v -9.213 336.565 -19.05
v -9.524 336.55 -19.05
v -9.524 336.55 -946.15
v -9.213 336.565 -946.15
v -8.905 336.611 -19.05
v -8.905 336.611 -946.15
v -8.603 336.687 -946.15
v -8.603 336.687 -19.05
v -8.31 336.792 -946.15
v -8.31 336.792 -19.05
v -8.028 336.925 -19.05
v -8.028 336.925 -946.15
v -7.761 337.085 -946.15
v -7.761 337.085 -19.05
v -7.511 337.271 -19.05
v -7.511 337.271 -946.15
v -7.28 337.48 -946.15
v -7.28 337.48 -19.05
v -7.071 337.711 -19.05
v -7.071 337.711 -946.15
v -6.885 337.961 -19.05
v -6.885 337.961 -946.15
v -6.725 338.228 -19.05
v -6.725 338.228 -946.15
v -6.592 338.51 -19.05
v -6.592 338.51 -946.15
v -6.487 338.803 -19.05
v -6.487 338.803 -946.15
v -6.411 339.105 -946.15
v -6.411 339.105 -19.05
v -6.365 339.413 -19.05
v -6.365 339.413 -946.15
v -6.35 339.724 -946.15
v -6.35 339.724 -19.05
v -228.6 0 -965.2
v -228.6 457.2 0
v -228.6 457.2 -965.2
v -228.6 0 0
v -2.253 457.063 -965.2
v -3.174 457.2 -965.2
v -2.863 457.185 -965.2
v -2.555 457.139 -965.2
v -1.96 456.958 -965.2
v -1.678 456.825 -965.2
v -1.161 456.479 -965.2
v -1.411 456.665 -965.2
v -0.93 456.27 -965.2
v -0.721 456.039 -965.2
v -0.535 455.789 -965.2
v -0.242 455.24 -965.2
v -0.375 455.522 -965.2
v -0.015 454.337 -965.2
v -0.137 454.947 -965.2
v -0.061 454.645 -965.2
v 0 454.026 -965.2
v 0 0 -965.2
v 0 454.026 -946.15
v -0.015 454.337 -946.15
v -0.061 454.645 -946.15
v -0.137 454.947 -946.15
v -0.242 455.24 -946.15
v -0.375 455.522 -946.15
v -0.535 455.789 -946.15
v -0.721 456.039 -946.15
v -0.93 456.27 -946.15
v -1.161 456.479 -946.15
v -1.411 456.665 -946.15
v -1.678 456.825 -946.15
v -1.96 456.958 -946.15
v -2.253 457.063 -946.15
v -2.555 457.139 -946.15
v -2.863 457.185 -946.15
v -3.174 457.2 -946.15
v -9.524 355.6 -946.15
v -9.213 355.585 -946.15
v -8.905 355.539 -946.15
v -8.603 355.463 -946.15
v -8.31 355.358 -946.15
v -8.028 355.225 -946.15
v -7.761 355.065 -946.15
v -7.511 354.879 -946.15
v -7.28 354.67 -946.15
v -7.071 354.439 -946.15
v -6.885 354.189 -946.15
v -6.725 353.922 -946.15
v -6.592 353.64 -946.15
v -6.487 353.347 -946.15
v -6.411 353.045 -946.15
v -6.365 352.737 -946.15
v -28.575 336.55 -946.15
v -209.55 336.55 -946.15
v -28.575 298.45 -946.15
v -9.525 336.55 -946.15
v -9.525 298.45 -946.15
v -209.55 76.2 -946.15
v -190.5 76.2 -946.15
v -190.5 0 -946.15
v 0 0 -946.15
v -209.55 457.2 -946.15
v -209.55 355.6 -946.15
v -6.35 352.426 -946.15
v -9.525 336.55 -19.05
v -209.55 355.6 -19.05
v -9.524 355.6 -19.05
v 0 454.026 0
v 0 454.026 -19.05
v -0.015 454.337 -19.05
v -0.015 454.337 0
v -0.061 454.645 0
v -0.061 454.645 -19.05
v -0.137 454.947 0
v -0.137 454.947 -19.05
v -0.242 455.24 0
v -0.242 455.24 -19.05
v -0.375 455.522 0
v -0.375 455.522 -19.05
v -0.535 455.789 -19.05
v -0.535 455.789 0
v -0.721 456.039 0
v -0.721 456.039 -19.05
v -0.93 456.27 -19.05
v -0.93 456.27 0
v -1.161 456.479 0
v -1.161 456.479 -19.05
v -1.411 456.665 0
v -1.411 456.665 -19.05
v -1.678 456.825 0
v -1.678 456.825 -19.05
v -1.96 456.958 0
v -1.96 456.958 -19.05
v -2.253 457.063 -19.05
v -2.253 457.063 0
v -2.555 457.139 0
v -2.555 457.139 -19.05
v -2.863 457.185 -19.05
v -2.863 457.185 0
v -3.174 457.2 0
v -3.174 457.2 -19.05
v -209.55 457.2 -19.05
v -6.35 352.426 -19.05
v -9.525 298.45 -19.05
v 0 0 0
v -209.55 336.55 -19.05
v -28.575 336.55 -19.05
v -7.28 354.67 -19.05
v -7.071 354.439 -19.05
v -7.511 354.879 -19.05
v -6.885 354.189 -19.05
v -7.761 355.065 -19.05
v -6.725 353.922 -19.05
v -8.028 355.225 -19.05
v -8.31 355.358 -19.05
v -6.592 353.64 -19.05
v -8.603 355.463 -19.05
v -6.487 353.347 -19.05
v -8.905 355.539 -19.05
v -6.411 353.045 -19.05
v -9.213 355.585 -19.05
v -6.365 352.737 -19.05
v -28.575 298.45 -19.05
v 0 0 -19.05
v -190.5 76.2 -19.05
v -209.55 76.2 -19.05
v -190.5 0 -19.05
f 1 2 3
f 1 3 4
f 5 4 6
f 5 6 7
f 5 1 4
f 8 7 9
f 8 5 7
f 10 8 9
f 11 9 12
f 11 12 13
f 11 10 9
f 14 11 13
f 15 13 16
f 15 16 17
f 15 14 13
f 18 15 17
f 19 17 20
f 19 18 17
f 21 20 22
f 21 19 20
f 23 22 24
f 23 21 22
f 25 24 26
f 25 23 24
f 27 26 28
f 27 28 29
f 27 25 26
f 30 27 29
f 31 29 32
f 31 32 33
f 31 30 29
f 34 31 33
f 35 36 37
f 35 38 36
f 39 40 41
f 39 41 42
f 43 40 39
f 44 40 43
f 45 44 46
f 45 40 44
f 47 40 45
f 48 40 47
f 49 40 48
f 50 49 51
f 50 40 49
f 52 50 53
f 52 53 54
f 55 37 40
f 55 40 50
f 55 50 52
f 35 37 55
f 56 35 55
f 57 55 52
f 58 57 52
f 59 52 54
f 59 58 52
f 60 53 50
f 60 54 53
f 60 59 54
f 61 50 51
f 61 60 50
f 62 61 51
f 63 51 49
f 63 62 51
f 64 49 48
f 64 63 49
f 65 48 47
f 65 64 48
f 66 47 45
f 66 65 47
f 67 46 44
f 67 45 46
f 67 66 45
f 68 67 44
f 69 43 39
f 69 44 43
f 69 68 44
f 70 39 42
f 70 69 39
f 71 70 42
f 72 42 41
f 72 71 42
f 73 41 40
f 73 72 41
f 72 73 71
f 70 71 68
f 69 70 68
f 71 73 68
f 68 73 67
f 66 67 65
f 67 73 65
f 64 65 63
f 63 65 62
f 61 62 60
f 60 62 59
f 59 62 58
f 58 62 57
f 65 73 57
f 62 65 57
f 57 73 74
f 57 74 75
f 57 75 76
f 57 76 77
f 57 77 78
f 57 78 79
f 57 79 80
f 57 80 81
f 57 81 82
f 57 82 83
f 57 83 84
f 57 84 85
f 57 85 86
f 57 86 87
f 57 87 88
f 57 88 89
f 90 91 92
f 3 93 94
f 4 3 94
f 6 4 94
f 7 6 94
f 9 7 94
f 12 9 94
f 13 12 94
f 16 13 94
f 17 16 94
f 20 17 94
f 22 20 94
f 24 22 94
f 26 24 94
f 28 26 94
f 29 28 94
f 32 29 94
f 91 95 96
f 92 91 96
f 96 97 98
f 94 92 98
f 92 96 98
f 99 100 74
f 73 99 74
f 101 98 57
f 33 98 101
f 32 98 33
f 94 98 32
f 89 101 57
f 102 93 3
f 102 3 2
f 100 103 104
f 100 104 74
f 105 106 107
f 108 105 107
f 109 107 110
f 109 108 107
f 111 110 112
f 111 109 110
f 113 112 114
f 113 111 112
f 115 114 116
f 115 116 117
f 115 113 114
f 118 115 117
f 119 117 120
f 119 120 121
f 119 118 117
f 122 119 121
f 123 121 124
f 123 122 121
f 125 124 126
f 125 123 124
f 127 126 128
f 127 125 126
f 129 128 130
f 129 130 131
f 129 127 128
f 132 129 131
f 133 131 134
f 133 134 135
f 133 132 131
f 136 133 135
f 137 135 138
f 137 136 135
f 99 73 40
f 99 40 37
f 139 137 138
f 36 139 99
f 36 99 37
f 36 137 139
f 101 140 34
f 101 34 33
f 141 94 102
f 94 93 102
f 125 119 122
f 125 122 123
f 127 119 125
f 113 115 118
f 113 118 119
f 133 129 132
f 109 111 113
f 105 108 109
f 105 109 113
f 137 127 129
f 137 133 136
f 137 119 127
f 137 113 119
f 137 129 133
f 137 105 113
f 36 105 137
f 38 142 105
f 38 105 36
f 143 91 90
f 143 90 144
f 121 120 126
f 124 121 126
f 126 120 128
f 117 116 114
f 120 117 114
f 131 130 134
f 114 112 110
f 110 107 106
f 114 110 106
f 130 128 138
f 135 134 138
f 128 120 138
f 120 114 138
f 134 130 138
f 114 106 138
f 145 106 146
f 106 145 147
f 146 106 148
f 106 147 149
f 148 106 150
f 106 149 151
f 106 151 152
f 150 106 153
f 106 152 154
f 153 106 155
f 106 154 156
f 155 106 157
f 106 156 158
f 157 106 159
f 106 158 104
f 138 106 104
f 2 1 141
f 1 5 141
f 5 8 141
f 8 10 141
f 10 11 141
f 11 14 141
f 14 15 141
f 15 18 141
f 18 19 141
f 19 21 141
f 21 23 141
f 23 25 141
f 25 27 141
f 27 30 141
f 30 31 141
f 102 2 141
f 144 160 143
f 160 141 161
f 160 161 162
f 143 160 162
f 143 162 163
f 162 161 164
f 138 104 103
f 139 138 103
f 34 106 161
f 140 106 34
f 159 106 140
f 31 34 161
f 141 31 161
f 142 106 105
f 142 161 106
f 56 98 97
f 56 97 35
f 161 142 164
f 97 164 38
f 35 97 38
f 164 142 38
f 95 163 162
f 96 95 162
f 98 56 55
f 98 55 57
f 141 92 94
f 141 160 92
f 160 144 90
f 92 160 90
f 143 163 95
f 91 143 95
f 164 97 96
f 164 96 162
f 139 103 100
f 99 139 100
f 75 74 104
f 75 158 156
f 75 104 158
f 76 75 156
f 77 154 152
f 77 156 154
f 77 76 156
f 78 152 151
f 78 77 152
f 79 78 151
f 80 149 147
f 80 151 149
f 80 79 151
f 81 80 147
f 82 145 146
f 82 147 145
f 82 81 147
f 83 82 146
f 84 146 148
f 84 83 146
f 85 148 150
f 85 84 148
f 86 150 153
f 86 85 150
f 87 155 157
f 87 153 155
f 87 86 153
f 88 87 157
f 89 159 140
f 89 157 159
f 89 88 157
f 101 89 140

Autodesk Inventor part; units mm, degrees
ref_plane "YZ Plane" through (0, 0, 0) normal (1, 0, 0) x (0, 1, 0)
ref_plane "XZ Plane" through (0, 0, 0) normal (0, 1, 0) x (-1, 0, 0)
ref_plane "XY Plane" through (0, 0, 0) normal (0, 0, 1) x (1, 0, 0)
sketch "Sketch1" plane through (0, 0, 0) normal (0, 1, 0) x (-1, 0, 0)
  line L0 (0, 0) -> (228.6, 0)
  line L1 (228.6, 0) -> (228.6, -965.2)
  line L2 (228.6, -965.2) -> (0, -965.2)
  line L3 (0, -965.2) -> (0, 0)
  line L4 (0, -19.05) -> (209.55, -19.05)
  line L5 (209.55, -19.05) -> (209.55, -946.15)
  line L6 (209.55, -946.15) -> (0, -946.15)
  line L7 (0, -946.15) -> (0, -19.05)
  point P0 (0, -946.15)
  dimension "d0" = 228.6
  dimension "d1" = 965.2
  dimension "d2" = 19.05
  dimension "d3" = 19.05
  dimension "d4" = 19.05
extrude "Extrusion1" add sketch "Sketch1" along normal blind 457.2 contours L0 L1 L2 L3 L6 L5 L4
sketch "Sketch2" plane through (0, 0, 0) normal (0, -1, 0) x (1, 0, 0)
  line L0 (0, -19.05) -> (-209.55, -19.05) projected
  line L1 (-209.55, -19.05) -> (-209.55, -946.15) projected
  line L2 (-190.5, -19.05) -> (-209.55, -19.05)
  line L3 (-209.55, -19.05) -> (-209.55, -946.15)
  line L4 (-209.55, -946.15) -> (-190.5, -946.15)
  line L5 (-190.5, -946.15) -> (-190.5, -19.05)
  point P0 (0, 0)
  dimension "d7" = 19.05
extrude "Extrusion2" add sketch "Sketch2" against normal blind 76.2
sketch "Sketch3" plane through (-209.55, 457.2, -19.05) normal (1, 0, 0) x (0, 0, -1)
  line L0 (0, -381) -> (927.1, -381) projected
  line L1 (927.1, -381) -> (927.1, 0) projected
  line L2 (0, 0) -> (927.1, 0) projected
  line L3 (0, -381) -> (0, 0) projected
  line L4 (0, -457.2) -> (0, 0) projected
  line L5 (927.1, -457.2) -> (927.1, 0) projected
  line L6 (0, -101.6) -> (927.1, -101.6)
  line L7 (927.1, -101.6) -> (927.1, -120.65)
  line L8 (927.1, -120.65) -> (0, -120.65)
  line L9 (0, -120.65) -> (0, -101.6)
  point P0 (-19.05, -457.2)
  point P1 (0, -120.65)
  point P2 (927.1, -120.65)
  point P3 (927.1, -101.6)
  dimension "d10" = 19.05
  dimension "d11" = 101.6
extrude "Extrusion3" add sketch "Sketch3" along normal blind 203.2 contours L3 L6 L1 L8
sketch "Sketch4" plane through (-209.55, 336.55, -946.15) normal (0, -1, 0) x (1, 0, 0)
  line L0 (209.55, 927.1) -> (19.05, 927.1) projected
  line L1 (19.05, 0) -> (209.55, 0) projected
  line L2 (200.025, 927.1) -> (180.975, 927.1)
  line L3 (180.975, 927.1) -> (180.975, 0)
  line L4 (180.975, 0) -> (200.025, 0)
  line L5 (200.025, 0) -> (200.025, 927.1)
  line L6 (203.2, 927.1) -> (203.2, 0) projected
  point P0 (209.55, 946.15)
  point P1 (200.025, 0)
  dimension "d14" = 19.05
  dimension "d15" = 3.175
extrude "Extrusion4" add sketch "Sketch4" along normal blind 38.1 contours L5 L1 L3 L0
fillet "Fillet1" radius 3.175 4 edges at (-6.35, 355.6, -482.6) (-6.35, 336.55, -482.6) (0, 457.2, -9.525) (0, 457.2, -955.675)
properties part number "Shelf" material "Wood (Birch)"
